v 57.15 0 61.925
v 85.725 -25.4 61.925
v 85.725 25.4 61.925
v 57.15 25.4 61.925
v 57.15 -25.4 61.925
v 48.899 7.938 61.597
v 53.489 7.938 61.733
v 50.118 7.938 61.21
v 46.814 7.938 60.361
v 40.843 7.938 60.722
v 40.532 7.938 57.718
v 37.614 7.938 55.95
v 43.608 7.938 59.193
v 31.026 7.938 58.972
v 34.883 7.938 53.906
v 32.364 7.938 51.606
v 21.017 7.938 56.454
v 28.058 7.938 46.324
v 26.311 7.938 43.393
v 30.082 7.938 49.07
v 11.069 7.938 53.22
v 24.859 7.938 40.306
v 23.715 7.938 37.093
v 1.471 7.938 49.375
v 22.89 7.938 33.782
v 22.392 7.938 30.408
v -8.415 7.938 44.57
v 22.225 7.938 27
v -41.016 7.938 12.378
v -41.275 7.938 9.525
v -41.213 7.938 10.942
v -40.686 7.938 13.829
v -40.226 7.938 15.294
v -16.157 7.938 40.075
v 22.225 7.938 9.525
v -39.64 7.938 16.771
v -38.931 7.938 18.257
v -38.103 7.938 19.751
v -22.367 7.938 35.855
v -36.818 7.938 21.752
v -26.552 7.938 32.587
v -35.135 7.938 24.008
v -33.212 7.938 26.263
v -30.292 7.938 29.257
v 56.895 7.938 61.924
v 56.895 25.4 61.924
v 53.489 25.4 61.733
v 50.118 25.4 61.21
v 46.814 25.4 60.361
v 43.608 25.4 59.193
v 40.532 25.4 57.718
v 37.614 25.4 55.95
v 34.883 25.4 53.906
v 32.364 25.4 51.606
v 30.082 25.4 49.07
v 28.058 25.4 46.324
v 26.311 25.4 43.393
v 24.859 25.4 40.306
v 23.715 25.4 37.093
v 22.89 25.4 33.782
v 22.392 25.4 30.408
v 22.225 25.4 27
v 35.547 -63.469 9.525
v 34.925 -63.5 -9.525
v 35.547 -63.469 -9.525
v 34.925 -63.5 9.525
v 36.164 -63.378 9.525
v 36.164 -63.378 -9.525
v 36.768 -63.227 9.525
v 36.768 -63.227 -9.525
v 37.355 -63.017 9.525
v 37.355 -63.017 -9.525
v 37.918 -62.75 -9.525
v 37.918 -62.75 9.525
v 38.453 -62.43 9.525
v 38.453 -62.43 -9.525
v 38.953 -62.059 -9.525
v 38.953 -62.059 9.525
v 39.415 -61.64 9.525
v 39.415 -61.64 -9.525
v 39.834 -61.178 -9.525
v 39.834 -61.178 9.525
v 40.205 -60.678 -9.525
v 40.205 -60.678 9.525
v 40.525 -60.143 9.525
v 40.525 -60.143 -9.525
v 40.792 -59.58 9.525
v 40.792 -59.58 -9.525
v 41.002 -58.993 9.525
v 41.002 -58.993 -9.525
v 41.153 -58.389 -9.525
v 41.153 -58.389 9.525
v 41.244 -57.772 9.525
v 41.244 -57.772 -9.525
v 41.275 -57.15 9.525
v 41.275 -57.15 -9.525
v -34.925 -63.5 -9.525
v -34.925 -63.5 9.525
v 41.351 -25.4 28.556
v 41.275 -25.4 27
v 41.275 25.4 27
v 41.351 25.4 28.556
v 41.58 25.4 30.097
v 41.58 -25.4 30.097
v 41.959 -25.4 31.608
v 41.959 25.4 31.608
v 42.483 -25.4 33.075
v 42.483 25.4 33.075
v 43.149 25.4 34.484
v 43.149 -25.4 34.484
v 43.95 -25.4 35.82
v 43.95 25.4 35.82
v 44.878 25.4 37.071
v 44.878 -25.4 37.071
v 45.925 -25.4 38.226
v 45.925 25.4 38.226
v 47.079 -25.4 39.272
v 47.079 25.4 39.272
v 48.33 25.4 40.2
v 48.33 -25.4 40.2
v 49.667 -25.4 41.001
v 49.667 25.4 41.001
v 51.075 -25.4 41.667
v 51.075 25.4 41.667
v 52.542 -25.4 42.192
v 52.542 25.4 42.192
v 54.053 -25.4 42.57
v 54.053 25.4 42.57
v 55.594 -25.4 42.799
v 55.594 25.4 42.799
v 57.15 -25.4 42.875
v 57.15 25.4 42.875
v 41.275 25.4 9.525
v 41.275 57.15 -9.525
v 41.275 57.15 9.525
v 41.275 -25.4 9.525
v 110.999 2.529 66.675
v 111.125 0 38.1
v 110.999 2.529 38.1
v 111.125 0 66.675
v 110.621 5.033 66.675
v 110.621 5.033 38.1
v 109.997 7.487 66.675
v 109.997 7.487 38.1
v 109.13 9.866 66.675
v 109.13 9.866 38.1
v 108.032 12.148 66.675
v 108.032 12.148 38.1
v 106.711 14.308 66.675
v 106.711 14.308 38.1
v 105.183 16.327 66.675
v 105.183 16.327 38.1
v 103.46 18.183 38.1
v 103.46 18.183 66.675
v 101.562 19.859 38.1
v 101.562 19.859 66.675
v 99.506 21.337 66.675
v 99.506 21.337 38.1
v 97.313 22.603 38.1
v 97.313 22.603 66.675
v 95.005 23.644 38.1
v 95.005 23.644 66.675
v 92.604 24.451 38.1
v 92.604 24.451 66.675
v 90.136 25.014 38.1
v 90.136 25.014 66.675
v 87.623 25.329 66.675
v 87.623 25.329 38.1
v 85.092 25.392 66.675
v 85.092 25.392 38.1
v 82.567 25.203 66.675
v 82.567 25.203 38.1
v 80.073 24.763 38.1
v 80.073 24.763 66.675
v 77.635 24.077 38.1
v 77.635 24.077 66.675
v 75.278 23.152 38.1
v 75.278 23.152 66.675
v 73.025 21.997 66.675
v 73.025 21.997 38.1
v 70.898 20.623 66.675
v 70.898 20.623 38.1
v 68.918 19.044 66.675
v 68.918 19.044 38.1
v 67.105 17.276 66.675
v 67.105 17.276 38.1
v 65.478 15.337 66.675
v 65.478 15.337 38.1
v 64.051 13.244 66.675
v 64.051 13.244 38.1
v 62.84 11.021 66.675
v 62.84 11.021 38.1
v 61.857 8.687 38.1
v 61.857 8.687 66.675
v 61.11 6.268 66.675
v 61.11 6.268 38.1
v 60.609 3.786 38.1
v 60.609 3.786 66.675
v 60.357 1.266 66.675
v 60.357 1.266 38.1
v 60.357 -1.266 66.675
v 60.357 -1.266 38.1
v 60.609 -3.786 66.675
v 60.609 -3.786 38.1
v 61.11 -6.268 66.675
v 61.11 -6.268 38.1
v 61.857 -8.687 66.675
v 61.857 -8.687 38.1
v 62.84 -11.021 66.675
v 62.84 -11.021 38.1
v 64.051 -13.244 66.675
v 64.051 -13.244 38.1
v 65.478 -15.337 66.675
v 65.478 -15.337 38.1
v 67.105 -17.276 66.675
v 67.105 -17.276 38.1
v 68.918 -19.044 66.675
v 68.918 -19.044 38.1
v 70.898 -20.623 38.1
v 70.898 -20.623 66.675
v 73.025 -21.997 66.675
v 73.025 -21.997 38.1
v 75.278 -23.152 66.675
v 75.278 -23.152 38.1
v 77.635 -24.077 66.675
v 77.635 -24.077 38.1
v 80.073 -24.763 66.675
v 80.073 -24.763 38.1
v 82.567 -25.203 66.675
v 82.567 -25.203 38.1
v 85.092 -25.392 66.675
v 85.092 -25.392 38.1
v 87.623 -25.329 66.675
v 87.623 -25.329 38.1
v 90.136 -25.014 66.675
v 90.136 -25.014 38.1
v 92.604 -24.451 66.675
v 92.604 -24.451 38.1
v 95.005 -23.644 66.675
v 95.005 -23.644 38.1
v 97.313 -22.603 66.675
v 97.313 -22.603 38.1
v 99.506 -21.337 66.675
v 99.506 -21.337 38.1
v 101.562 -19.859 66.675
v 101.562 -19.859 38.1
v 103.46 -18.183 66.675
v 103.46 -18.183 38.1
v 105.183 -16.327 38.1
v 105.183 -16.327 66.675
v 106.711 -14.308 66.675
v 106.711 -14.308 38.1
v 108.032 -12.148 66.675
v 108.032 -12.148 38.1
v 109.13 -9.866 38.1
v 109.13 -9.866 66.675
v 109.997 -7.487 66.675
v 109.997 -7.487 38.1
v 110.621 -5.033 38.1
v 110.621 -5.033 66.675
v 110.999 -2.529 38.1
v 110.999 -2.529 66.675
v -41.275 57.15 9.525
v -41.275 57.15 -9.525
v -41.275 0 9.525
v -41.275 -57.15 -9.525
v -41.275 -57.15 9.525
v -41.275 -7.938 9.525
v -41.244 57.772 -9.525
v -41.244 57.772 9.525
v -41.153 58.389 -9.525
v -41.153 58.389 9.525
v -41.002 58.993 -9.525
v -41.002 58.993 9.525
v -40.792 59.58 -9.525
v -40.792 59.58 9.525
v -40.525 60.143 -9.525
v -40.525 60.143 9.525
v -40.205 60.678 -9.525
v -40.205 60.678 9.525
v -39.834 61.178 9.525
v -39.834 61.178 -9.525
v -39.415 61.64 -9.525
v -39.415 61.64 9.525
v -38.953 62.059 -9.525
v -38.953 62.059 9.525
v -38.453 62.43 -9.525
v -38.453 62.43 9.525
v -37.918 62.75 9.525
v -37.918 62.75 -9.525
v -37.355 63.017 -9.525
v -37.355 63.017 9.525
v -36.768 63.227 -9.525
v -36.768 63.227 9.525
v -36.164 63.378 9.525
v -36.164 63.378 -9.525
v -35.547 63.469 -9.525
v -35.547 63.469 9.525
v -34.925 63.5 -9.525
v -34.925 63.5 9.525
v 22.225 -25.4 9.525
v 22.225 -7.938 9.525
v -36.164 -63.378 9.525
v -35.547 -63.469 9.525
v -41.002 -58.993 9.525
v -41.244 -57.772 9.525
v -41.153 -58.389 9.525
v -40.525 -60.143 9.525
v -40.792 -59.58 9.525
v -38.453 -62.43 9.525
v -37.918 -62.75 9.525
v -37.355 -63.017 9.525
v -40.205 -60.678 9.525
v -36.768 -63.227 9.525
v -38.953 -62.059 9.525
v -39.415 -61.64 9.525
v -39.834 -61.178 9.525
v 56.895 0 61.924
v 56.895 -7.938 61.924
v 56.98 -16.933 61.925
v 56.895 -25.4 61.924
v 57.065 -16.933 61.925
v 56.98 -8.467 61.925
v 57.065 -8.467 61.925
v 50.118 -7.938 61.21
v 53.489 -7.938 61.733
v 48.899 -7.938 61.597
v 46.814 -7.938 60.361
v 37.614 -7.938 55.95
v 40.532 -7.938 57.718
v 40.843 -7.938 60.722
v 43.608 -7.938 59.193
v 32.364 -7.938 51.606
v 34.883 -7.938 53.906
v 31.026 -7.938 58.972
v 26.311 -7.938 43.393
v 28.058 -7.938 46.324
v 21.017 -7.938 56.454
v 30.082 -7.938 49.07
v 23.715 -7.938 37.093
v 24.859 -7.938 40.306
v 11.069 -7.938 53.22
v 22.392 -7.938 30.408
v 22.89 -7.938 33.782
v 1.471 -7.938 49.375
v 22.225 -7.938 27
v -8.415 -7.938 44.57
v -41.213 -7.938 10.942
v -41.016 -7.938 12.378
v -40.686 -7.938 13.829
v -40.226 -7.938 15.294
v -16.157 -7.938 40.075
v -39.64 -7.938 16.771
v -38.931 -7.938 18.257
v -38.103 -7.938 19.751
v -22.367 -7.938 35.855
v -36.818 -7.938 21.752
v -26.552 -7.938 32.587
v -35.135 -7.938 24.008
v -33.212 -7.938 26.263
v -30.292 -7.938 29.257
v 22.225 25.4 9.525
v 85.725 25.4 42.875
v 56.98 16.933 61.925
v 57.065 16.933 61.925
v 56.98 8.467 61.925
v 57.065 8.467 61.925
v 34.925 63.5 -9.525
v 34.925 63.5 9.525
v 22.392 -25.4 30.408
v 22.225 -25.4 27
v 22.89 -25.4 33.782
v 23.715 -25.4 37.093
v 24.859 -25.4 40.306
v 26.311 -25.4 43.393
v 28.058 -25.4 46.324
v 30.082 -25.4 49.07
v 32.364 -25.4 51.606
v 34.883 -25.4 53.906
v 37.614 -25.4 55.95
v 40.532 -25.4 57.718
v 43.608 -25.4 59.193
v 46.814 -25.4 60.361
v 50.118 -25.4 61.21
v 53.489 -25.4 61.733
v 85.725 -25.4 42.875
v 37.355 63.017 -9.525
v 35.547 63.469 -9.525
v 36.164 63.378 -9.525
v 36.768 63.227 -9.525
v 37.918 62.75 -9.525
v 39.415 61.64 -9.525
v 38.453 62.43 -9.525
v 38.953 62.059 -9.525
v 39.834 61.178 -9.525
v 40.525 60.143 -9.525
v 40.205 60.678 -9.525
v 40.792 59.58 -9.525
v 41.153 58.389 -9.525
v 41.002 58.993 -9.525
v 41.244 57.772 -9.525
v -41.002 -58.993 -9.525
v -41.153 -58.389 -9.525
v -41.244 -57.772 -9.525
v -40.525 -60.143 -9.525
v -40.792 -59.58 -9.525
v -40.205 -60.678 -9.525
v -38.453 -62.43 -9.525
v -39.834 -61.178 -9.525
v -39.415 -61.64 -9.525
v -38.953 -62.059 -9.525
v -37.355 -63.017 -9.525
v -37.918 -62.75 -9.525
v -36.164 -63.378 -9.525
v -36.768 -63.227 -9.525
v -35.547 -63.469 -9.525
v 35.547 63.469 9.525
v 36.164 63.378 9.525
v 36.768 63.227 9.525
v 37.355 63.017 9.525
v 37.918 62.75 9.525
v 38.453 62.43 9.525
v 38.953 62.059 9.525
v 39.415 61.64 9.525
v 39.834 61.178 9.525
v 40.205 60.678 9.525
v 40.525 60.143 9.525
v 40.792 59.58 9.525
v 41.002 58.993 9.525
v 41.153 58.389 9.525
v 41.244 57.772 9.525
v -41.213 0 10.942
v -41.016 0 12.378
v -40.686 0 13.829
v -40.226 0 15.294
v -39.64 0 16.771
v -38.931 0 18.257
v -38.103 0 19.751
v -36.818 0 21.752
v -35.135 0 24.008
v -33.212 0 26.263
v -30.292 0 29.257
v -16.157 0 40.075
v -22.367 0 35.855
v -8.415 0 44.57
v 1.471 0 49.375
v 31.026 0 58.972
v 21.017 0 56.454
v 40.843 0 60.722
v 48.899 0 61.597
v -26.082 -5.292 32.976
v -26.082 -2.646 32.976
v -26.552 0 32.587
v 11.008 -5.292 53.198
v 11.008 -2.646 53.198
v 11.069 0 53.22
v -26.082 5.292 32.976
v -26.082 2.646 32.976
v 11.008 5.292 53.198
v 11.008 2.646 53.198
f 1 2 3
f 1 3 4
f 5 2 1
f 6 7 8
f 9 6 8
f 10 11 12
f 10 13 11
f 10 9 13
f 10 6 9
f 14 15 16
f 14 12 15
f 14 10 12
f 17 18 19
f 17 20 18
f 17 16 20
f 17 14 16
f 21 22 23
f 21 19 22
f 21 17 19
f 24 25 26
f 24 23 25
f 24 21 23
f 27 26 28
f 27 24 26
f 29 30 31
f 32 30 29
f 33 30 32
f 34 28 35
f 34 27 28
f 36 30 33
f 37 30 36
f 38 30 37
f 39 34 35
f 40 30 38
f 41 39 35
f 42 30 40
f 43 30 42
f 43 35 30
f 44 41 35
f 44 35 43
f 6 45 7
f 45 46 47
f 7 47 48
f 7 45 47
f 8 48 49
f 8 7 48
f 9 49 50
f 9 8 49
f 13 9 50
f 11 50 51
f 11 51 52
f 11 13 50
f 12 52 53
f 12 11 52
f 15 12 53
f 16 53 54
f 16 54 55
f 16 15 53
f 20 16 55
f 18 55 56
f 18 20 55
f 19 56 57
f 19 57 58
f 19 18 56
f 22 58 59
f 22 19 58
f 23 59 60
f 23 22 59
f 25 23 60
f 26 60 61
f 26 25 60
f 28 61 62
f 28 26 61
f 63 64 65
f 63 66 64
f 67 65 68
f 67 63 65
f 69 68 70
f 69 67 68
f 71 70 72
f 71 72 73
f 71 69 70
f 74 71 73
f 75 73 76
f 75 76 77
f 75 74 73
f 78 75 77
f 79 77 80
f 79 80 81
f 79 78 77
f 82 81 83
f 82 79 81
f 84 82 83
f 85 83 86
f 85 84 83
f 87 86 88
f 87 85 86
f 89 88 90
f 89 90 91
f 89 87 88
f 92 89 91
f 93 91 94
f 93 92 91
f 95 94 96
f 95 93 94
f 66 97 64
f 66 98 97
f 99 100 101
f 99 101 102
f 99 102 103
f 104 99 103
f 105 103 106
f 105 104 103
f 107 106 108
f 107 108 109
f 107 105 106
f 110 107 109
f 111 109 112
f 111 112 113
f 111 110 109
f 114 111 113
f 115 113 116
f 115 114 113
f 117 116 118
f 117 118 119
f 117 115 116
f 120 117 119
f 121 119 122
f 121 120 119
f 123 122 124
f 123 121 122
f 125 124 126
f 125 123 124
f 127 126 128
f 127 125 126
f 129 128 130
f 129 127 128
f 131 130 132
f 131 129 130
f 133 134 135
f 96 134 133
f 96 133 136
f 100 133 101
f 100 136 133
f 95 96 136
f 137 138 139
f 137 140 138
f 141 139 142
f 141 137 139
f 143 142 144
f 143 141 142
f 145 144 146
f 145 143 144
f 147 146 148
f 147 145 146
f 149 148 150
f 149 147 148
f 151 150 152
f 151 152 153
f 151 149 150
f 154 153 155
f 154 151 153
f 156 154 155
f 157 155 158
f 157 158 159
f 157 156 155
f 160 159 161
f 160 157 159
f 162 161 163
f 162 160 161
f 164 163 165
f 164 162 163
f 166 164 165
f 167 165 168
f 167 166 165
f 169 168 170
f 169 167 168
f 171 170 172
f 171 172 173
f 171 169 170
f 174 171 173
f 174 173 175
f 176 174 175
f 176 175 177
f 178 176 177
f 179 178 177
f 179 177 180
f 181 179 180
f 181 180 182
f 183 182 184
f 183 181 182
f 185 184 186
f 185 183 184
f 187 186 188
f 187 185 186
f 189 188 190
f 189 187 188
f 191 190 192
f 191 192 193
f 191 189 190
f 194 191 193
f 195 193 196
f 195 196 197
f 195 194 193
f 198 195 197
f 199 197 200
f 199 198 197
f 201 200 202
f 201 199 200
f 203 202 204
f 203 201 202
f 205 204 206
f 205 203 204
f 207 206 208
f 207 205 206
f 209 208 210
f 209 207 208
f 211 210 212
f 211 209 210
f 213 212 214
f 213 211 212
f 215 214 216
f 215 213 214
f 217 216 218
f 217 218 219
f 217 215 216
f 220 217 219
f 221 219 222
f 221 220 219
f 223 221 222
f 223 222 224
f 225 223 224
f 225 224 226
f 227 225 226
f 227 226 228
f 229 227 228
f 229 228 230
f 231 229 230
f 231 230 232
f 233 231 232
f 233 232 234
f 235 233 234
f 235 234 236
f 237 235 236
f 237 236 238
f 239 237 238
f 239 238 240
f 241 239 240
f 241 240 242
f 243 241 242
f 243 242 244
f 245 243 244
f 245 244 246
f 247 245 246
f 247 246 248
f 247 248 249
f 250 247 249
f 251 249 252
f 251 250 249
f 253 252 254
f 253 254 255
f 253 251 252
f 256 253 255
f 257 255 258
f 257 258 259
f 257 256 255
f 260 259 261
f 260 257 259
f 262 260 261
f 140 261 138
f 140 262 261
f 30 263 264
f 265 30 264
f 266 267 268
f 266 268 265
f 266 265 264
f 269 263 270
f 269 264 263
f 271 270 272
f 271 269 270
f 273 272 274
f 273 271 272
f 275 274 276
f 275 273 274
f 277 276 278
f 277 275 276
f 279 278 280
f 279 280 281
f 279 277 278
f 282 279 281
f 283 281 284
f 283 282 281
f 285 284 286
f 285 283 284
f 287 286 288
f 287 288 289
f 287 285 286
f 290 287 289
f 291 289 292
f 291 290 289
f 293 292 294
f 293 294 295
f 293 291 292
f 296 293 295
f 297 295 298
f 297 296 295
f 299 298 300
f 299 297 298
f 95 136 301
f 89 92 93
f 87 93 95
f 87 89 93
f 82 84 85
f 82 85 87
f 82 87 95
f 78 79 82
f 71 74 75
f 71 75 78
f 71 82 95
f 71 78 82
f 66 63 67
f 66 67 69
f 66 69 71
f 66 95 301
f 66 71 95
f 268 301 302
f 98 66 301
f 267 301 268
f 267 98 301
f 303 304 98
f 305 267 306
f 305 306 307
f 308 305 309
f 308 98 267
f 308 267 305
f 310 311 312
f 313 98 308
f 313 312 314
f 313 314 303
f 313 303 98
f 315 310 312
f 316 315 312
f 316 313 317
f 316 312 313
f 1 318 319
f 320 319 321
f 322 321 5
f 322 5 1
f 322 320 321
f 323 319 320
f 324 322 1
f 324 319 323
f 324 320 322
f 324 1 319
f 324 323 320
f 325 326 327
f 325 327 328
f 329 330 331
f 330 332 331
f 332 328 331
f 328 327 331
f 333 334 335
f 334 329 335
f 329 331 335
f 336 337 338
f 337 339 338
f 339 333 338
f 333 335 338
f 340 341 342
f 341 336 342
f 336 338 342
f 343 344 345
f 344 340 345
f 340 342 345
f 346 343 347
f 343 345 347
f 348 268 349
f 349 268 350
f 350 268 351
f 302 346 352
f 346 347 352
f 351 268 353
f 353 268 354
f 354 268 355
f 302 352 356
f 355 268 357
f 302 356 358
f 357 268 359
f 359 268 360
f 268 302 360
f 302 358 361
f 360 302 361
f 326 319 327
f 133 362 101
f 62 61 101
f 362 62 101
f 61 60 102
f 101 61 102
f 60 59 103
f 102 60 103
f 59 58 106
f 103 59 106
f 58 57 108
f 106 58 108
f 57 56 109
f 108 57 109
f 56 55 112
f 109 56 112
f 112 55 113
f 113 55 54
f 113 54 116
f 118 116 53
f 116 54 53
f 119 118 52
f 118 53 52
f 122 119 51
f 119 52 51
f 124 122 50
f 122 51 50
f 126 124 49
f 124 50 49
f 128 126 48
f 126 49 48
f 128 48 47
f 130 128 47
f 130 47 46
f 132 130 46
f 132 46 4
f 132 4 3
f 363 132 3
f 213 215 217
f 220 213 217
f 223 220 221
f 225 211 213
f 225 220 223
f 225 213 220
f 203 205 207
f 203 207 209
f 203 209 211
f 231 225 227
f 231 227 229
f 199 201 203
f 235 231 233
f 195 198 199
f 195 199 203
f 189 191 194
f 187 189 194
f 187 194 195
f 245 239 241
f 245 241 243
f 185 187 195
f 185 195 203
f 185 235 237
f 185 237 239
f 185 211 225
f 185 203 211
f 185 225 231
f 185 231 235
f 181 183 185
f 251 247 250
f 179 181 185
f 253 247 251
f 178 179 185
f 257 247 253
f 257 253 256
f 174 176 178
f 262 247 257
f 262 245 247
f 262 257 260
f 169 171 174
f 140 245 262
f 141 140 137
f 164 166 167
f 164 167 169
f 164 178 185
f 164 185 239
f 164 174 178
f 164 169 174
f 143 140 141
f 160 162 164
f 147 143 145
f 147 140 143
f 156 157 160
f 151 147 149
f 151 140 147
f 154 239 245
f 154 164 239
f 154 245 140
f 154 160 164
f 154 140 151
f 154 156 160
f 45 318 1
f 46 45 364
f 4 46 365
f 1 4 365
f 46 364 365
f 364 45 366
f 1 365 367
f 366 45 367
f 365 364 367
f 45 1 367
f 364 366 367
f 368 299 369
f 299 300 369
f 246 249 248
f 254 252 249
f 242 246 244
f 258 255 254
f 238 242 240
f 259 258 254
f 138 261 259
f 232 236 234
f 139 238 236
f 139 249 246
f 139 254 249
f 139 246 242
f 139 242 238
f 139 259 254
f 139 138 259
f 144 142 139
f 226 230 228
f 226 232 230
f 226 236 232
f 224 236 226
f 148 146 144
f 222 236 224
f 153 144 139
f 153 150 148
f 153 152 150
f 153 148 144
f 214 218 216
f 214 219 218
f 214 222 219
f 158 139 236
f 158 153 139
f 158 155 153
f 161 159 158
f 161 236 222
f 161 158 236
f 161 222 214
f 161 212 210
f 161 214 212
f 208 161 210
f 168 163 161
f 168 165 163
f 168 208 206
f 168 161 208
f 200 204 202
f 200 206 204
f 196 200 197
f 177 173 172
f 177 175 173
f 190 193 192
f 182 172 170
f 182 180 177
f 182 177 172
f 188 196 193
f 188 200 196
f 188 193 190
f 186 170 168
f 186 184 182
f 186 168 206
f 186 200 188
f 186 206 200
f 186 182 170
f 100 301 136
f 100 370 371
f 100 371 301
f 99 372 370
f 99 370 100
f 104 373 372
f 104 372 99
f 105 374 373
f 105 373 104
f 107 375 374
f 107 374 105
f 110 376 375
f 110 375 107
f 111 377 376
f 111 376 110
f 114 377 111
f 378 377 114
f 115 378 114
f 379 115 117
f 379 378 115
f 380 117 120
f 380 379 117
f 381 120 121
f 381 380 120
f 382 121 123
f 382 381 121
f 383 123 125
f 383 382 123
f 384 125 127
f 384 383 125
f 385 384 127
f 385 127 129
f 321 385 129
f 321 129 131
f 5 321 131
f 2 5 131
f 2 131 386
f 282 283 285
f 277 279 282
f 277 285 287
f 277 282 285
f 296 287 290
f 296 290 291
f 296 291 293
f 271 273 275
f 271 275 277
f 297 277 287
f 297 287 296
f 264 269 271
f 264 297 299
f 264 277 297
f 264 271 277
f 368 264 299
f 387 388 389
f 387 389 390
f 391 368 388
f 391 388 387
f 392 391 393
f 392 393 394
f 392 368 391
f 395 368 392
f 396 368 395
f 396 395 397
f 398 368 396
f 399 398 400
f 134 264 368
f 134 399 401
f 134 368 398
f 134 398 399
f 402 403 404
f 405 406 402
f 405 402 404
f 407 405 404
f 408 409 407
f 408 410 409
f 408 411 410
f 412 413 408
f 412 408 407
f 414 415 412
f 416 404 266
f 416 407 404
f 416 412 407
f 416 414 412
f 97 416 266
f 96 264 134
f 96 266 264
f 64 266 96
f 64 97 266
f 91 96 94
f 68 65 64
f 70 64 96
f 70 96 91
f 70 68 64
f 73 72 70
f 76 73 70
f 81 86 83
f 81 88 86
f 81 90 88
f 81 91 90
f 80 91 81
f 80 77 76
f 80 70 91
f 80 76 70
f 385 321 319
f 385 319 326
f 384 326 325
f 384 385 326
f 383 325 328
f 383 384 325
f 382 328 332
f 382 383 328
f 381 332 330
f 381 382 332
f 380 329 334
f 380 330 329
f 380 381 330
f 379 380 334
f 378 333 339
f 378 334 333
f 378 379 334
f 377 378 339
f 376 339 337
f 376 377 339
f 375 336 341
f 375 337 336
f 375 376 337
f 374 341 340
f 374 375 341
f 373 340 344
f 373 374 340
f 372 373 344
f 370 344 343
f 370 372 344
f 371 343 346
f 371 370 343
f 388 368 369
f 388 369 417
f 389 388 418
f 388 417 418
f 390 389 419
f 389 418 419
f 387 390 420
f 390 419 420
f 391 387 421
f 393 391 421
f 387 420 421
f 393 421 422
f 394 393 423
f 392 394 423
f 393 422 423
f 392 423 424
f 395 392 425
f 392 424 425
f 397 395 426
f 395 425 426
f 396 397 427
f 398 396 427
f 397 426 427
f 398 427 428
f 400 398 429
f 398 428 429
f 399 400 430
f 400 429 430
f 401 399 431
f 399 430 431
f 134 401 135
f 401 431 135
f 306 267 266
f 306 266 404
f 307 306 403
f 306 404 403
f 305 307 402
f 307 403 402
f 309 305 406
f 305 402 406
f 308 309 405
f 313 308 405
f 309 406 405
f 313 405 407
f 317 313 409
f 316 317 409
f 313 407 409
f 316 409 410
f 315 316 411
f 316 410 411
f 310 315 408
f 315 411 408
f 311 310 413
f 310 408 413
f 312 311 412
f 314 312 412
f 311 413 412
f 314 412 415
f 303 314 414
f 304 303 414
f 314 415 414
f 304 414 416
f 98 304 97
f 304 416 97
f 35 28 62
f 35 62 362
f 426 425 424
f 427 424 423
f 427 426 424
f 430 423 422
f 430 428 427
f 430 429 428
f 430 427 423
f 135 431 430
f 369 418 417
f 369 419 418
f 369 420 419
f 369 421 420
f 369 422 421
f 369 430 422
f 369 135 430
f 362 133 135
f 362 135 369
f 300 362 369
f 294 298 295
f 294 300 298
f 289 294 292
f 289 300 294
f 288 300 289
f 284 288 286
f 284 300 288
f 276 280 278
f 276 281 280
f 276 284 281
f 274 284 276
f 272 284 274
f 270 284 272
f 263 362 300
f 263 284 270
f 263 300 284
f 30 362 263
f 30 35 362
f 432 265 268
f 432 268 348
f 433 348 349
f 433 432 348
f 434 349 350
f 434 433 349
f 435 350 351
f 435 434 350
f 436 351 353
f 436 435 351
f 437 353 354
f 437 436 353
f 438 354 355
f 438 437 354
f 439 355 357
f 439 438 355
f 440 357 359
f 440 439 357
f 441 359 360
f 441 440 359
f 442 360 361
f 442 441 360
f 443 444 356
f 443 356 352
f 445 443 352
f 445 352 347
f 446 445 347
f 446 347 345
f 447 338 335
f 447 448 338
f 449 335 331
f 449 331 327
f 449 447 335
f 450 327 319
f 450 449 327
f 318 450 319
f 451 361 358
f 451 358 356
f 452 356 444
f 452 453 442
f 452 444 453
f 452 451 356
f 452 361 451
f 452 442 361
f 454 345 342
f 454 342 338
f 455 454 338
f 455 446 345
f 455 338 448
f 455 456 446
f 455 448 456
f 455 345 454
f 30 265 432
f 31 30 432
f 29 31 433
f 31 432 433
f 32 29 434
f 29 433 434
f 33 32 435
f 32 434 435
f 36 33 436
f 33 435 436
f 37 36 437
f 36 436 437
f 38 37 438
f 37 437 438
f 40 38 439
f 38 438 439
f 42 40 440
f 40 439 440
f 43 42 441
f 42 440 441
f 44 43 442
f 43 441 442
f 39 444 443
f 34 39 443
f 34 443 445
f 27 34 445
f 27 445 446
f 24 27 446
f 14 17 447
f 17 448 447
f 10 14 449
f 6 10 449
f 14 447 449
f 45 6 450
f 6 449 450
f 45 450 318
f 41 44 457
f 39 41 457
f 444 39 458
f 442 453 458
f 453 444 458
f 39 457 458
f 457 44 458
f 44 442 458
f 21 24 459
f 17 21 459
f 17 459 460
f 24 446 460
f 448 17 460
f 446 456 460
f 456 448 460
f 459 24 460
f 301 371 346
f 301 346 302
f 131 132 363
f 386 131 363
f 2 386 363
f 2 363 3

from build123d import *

# Parameters (mm, degrees)
F1_DEPTH = 63.5
F0_W     = 25.3999955219
F0_H     = 19.05
F2_DEPTH = 25.4
F3_DEPTH = 7.9375
F5_R     = 6.35


with BuildPart() as f1:
    # F0 (on Front) → F1 (new body, symmetric)
    with BuildSketch(Plane.XZ):
        Polygon((-41.275, -9.525), (41.275, -9.525), (41.275, 9.525), (22.225, 9.525), (-41.275, 9.525), align=None)
    extrude(amount=F1_DEPTH, both=True)

    # F0 (on Front) → F2 (join, symmetric)
    with BuildSketch(Plane.XZ):
        with BuildLine():
            Line((22.225, 9.525), (41.275, 9.525))
            Line((41.275, 9.525), (41.275, 27.0002))
            ThreePointArc((41.275, 27.0002), (45.9246798487, 38.2255201513), (57.15, 42.8752))
            Line((57.15, 42.8752), (60.3250044781, 42.8752))
            Line((60.3250044781, 42.8752), (60.3250044781, 61.9252))
            Line((60.3250044781, 61.9252), (57.15, 61.9252))
            add(Edge.make_bspline(
                [(56.894856977, 61.9242680196), (56.9799269157, 61.9246804993), (57.064974715, 61.9249912383), (57.15, 61.9252)],
                knots=[111.298347533, 111.298347533, 111.298347533, 111.298347533, 111.5045361635, 111.5045361635, 111.5045361635, 111.5045361635], degree=3))
            ThreePointArc((56.894856977, 61.9242680196), (32.3642531374, 51.6055322973), (22.225, 27.0002))
            Line((22.225, 27.0002), (22.225, 9.525))
        make_face()
        with Locations((73.025002239, 52.4002)):
            Rectangle(F0_W, F0_H)
    extrude(amount=F2_DEPTH, both=True)

    # F0 (on Front) → F3 (join, symmetric)
    with BuildSketch(Plane.XZ):
        with BuildLine():
            add(Edge.make_bspline(
                [(-41.275, 9.525), (-41.3955935433, 31.8345558786), (10.9750427892, 61.7016160341), (56.894856977, 61.9242680196)],
                knots=[0, 0, 0, 0, 111.298347533, 111.298347533, 111.298347533, 111.298347533], degree=3))
            Line((-41.275, 9.525), (22.225, 9.525))
            Line((22.225, 9.525), (22.225, 27.0002))
            ThreePointArc((22.225, 27.0002), (32.3642531374, 51.6055322973), (56.894856977, 61.9242680196))
        make_face()
    extrude(amount=F3_DEPTH, both=True)

    # F5
    f5_edges = [f1.edges().sort_by_distance(p)[0] for p in [
        (-41.275, -63.5, 0),
        (41.275, -63.5, 0),
        (41.275, 63.5, 0),
        (-41.275, 63.5, 0),
    ]]
    fillet(f5_edges, radius=F5_R)


with BuildPart() as f4:
    # F0 (on Front) → F4 (revolve)
    with BuildSketch(Plane.XZ):
        Polygon((85.725, 61.9252), (85.725, 42.8752), (85.725, 38.1), (111.1249955219, 38.1), (111.1249955219, 66.675), (85.725, 66.675), align=None)
    revolve(axis=Axis((85.725, 0, 52.3875), (0, 0, 1)))


solid = Compound([f1.part, f4.part])
